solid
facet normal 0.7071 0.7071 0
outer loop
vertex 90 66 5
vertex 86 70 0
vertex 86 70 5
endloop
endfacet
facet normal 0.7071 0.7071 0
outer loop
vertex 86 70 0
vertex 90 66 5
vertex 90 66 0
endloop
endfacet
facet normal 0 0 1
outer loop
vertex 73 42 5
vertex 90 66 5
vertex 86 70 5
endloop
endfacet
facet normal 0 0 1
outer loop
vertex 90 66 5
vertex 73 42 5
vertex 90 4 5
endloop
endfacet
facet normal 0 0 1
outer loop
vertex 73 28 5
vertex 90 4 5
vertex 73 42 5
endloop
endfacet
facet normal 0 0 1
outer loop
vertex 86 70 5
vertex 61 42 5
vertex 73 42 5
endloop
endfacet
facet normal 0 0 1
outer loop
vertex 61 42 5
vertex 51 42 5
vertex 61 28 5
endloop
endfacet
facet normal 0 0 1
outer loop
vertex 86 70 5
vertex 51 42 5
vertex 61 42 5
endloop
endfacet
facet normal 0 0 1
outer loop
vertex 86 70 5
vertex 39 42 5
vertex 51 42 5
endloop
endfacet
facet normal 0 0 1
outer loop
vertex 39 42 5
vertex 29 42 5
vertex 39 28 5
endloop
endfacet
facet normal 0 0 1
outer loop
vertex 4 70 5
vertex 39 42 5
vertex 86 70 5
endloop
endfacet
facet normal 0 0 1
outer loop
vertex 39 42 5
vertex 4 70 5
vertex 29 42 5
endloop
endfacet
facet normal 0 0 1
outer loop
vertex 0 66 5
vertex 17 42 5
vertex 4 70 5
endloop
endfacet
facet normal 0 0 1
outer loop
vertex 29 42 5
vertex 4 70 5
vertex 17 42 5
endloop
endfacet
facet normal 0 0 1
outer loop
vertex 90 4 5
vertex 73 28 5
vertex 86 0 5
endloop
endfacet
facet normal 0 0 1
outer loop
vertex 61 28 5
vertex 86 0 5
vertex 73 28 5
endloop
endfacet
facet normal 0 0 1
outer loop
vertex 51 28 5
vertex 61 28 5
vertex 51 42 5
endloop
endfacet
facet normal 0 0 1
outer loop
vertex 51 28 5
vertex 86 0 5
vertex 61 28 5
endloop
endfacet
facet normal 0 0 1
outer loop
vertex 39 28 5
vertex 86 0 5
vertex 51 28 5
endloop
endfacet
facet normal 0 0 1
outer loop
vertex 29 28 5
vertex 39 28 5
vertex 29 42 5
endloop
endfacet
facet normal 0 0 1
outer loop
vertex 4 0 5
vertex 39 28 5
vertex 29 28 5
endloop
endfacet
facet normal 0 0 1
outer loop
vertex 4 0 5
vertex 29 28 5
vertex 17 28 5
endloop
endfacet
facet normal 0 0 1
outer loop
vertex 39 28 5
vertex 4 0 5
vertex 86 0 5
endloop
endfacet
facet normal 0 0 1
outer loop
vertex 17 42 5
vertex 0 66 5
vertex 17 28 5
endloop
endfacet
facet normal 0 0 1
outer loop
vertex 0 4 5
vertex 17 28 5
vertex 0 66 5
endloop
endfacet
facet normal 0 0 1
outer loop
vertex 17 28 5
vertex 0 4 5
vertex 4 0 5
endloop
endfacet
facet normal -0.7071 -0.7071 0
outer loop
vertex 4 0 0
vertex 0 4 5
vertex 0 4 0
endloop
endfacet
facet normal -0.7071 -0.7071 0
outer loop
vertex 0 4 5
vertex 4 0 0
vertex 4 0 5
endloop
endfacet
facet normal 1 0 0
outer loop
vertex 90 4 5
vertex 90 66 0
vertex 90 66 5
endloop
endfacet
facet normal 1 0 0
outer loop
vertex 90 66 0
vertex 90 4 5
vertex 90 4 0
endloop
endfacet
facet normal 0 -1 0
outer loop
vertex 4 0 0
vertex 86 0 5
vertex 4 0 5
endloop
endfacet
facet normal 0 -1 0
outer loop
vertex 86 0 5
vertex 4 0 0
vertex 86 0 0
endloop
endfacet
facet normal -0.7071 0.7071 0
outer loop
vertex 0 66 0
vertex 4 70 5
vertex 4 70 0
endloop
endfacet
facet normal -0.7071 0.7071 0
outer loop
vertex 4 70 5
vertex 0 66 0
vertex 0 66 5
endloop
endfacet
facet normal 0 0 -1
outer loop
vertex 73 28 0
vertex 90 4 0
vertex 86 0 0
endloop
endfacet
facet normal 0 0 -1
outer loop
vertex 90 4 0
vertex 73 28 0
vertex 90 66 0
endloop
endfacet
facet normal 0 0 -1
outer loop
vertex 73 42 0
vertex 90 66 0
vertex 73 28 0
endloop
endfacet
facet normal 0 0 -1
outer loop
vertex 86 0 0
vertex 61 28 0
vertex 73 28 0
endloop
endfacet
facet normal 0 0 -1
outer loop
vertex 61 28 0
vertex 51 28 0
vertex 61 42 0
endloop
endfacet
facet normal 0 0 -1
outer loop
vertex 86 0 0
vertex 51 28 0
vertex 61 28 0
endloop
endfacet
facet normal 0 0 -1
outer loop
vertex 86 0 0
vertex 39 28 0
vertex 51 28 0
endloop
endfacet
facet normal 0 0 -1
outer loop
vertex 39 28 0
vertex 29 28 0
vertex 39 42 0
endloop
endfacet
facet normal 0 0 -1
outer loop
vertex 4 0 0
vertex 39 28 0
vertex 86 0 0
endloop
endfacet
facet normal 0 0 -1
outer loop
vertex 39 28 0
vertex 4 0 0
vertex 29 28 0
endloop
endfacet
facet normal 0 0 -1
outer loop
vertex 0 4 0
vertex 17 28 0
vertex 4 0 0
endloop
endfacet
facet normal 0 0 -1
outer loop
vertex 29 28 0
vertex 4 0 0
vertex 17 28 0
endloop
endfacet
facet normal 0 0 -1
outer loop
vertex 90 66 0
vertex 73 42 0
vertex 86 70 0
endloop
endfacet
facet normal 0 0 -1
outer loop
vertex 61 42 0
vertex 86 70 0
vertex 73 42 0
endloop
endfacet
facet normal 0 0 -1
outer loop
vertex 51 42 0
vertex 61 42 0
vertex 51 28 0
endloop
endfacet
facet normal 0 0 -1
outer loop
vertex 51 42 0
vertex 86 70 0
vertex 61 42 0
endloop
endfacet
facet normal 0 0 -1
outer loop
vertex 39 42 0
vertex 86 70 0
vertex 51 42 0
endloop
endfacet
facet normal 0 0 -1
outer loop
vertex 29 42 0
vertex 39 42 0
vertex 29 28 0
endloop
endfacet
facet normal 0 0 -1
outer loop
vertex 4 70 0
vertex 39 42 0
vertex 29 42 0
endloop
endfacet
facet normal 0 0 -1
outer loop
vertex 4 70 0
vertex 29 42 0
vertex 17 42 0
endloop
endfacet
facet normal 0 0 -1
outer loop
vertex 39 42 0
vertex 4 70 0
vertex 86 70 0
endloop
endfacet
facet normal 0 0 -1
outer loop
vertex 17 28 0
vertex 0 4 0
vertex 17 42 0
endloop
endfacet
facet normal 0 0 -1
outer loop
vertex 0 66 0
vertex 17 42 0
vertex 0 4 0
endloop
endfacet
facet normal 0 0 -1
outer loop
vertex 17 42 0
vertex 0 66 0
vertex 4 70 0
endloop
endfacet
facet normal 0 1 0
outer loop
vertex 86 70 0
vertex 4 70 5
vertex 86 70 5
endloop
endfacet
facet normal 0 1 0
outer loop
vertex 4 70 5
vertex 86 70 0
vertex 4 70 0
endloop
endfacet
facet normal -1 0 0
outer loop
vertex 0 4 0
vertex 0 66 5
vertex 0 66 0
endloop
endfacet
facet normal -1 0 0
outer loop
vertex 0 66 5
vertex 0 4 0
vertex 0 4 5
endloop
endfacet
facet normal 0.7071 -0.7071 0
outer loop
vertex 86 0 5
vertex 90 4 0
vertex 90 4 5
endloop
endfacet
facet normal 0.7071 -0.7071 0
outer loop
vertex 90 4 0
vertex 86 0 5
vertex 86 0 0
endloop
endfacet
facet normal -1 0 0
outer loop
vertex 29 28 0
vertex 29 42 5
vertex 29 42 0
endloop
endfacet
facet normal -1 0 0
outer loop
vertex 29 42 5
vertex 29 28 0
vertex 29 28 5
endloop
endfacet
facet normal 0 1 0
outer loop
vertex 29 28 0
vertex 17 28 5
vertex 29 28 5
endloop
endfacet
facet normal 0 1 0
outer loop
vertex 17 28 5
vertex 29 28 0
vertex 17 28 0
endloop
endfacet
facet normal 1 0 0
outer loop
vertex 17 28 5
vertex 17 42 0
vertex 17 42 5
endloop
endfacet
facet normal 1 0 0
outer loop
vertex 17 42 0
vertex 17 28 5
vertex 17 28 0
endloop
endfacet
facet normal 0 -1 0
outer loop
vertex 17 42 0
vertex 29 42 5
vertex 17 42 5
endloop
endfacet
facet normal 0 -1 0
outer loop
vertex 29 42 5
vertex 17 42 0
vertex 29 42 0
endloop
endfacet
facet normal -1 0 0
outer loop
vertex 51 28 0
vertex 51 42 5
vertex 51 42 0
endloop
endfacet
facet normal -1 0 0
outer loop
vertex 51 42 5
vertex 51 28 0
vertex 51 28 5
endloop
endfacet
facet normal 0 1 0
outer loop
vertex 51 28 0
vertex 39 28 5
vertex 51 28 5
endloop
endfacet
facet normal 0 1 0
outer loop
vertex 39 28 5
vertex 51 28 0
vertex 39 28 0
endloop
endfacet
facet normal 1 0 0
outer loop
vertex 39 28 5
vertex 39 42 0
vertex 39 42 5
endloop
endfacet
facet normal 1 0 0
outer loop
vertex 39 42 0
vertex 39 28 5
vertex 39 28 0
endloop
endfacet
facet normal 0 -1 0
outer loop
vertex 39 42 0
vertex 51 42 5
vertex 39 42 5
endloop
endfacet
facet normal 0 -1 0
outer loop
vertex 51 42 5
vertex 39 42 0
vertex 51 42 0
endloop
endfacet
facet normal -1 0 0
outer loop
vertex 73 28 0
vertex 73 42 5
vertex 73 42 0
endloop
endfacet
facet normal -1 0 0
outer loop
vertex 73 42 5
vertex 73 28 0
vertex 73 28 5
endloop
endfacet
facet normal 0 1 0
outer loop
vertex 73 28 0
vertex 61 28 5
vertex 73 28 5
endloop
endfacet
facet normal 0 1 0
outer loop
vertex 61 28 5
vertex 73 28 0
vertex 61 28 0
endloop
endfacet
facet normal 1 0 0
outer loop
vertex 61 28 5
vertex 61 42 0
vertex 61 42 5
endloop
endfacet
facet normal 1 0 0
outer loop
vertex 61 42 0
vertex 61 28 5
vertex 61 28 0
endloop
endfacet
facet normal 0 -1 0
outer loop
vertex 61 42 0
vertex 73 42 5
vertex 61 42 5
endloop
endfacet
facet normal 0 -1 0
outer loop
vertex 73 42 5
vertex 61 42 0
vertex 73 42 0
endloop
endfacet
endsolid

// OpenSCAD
$fn = 32;

// ----------------------------------------------------------------------
// Windowed plate: 3 voids, 90 x 70 x 5 mm
// ----------------------------------------------------------------------

// --- parameters (mm) ---
plate_l = 90;             // plate length, X
plate_w = 70;             // plate width, Y
plate_t = 5;              // plate thickness, Z
edge_margin = 12;         // wall from the plate edge to any window
windows = 3;              // number of windows in the row
win_l = 12;               // window length
win_w = 14;               // window width
win_pitch = 22;           // window pitch along X
depth_1 = 5;              // depth of void 1 (full thickness = through)
depth_2 = 5;              // depth of void 2 (full thickness = through)
depth_3 = 5;              // depth of void 3 (full thickness = through)
corner_c = 4;             // corner chamfer of the plate
fit_tol = 0.1;            // declared fit tolerance (prompt contract)
free_tol = 0.3;           // declared free tolerance (prompt contract)

profile = [[4, 0], [86, 0], [90, 4], [90, 66], [86, 70], [4, 70], [0, 66], [0, 4]];  // primary outline, 8 points, counter clockwise
void_1 = [[17, 28], [29, 28], [29, 42], [17, 42]];  // window 1 of the row, 4 points
void_2 = [[39, 28], [51, 28], [51, 42], [39, 42]];  // window 2 of the row, 4 points
void_3 = [[61, 28], [73, 28], [73, 42], [61, 42]];  // window 3 of the row, 4 points

// --- the one profile operation ---
difference() {
  linear_extrude(height = plate_t) polygon(points = profile);
  translate([0, 0, -1])
    linear_extrude(height = plate_t + 2) polygon(points = void_1);
  translate([0, 0, -1])
    linear_extrude(height = plate_t + 2) polygon(points = void_2);
  translate([0, 0, -1])
    linear_extrude(height = plate_t + 2) polygon(points = void_3);
}
